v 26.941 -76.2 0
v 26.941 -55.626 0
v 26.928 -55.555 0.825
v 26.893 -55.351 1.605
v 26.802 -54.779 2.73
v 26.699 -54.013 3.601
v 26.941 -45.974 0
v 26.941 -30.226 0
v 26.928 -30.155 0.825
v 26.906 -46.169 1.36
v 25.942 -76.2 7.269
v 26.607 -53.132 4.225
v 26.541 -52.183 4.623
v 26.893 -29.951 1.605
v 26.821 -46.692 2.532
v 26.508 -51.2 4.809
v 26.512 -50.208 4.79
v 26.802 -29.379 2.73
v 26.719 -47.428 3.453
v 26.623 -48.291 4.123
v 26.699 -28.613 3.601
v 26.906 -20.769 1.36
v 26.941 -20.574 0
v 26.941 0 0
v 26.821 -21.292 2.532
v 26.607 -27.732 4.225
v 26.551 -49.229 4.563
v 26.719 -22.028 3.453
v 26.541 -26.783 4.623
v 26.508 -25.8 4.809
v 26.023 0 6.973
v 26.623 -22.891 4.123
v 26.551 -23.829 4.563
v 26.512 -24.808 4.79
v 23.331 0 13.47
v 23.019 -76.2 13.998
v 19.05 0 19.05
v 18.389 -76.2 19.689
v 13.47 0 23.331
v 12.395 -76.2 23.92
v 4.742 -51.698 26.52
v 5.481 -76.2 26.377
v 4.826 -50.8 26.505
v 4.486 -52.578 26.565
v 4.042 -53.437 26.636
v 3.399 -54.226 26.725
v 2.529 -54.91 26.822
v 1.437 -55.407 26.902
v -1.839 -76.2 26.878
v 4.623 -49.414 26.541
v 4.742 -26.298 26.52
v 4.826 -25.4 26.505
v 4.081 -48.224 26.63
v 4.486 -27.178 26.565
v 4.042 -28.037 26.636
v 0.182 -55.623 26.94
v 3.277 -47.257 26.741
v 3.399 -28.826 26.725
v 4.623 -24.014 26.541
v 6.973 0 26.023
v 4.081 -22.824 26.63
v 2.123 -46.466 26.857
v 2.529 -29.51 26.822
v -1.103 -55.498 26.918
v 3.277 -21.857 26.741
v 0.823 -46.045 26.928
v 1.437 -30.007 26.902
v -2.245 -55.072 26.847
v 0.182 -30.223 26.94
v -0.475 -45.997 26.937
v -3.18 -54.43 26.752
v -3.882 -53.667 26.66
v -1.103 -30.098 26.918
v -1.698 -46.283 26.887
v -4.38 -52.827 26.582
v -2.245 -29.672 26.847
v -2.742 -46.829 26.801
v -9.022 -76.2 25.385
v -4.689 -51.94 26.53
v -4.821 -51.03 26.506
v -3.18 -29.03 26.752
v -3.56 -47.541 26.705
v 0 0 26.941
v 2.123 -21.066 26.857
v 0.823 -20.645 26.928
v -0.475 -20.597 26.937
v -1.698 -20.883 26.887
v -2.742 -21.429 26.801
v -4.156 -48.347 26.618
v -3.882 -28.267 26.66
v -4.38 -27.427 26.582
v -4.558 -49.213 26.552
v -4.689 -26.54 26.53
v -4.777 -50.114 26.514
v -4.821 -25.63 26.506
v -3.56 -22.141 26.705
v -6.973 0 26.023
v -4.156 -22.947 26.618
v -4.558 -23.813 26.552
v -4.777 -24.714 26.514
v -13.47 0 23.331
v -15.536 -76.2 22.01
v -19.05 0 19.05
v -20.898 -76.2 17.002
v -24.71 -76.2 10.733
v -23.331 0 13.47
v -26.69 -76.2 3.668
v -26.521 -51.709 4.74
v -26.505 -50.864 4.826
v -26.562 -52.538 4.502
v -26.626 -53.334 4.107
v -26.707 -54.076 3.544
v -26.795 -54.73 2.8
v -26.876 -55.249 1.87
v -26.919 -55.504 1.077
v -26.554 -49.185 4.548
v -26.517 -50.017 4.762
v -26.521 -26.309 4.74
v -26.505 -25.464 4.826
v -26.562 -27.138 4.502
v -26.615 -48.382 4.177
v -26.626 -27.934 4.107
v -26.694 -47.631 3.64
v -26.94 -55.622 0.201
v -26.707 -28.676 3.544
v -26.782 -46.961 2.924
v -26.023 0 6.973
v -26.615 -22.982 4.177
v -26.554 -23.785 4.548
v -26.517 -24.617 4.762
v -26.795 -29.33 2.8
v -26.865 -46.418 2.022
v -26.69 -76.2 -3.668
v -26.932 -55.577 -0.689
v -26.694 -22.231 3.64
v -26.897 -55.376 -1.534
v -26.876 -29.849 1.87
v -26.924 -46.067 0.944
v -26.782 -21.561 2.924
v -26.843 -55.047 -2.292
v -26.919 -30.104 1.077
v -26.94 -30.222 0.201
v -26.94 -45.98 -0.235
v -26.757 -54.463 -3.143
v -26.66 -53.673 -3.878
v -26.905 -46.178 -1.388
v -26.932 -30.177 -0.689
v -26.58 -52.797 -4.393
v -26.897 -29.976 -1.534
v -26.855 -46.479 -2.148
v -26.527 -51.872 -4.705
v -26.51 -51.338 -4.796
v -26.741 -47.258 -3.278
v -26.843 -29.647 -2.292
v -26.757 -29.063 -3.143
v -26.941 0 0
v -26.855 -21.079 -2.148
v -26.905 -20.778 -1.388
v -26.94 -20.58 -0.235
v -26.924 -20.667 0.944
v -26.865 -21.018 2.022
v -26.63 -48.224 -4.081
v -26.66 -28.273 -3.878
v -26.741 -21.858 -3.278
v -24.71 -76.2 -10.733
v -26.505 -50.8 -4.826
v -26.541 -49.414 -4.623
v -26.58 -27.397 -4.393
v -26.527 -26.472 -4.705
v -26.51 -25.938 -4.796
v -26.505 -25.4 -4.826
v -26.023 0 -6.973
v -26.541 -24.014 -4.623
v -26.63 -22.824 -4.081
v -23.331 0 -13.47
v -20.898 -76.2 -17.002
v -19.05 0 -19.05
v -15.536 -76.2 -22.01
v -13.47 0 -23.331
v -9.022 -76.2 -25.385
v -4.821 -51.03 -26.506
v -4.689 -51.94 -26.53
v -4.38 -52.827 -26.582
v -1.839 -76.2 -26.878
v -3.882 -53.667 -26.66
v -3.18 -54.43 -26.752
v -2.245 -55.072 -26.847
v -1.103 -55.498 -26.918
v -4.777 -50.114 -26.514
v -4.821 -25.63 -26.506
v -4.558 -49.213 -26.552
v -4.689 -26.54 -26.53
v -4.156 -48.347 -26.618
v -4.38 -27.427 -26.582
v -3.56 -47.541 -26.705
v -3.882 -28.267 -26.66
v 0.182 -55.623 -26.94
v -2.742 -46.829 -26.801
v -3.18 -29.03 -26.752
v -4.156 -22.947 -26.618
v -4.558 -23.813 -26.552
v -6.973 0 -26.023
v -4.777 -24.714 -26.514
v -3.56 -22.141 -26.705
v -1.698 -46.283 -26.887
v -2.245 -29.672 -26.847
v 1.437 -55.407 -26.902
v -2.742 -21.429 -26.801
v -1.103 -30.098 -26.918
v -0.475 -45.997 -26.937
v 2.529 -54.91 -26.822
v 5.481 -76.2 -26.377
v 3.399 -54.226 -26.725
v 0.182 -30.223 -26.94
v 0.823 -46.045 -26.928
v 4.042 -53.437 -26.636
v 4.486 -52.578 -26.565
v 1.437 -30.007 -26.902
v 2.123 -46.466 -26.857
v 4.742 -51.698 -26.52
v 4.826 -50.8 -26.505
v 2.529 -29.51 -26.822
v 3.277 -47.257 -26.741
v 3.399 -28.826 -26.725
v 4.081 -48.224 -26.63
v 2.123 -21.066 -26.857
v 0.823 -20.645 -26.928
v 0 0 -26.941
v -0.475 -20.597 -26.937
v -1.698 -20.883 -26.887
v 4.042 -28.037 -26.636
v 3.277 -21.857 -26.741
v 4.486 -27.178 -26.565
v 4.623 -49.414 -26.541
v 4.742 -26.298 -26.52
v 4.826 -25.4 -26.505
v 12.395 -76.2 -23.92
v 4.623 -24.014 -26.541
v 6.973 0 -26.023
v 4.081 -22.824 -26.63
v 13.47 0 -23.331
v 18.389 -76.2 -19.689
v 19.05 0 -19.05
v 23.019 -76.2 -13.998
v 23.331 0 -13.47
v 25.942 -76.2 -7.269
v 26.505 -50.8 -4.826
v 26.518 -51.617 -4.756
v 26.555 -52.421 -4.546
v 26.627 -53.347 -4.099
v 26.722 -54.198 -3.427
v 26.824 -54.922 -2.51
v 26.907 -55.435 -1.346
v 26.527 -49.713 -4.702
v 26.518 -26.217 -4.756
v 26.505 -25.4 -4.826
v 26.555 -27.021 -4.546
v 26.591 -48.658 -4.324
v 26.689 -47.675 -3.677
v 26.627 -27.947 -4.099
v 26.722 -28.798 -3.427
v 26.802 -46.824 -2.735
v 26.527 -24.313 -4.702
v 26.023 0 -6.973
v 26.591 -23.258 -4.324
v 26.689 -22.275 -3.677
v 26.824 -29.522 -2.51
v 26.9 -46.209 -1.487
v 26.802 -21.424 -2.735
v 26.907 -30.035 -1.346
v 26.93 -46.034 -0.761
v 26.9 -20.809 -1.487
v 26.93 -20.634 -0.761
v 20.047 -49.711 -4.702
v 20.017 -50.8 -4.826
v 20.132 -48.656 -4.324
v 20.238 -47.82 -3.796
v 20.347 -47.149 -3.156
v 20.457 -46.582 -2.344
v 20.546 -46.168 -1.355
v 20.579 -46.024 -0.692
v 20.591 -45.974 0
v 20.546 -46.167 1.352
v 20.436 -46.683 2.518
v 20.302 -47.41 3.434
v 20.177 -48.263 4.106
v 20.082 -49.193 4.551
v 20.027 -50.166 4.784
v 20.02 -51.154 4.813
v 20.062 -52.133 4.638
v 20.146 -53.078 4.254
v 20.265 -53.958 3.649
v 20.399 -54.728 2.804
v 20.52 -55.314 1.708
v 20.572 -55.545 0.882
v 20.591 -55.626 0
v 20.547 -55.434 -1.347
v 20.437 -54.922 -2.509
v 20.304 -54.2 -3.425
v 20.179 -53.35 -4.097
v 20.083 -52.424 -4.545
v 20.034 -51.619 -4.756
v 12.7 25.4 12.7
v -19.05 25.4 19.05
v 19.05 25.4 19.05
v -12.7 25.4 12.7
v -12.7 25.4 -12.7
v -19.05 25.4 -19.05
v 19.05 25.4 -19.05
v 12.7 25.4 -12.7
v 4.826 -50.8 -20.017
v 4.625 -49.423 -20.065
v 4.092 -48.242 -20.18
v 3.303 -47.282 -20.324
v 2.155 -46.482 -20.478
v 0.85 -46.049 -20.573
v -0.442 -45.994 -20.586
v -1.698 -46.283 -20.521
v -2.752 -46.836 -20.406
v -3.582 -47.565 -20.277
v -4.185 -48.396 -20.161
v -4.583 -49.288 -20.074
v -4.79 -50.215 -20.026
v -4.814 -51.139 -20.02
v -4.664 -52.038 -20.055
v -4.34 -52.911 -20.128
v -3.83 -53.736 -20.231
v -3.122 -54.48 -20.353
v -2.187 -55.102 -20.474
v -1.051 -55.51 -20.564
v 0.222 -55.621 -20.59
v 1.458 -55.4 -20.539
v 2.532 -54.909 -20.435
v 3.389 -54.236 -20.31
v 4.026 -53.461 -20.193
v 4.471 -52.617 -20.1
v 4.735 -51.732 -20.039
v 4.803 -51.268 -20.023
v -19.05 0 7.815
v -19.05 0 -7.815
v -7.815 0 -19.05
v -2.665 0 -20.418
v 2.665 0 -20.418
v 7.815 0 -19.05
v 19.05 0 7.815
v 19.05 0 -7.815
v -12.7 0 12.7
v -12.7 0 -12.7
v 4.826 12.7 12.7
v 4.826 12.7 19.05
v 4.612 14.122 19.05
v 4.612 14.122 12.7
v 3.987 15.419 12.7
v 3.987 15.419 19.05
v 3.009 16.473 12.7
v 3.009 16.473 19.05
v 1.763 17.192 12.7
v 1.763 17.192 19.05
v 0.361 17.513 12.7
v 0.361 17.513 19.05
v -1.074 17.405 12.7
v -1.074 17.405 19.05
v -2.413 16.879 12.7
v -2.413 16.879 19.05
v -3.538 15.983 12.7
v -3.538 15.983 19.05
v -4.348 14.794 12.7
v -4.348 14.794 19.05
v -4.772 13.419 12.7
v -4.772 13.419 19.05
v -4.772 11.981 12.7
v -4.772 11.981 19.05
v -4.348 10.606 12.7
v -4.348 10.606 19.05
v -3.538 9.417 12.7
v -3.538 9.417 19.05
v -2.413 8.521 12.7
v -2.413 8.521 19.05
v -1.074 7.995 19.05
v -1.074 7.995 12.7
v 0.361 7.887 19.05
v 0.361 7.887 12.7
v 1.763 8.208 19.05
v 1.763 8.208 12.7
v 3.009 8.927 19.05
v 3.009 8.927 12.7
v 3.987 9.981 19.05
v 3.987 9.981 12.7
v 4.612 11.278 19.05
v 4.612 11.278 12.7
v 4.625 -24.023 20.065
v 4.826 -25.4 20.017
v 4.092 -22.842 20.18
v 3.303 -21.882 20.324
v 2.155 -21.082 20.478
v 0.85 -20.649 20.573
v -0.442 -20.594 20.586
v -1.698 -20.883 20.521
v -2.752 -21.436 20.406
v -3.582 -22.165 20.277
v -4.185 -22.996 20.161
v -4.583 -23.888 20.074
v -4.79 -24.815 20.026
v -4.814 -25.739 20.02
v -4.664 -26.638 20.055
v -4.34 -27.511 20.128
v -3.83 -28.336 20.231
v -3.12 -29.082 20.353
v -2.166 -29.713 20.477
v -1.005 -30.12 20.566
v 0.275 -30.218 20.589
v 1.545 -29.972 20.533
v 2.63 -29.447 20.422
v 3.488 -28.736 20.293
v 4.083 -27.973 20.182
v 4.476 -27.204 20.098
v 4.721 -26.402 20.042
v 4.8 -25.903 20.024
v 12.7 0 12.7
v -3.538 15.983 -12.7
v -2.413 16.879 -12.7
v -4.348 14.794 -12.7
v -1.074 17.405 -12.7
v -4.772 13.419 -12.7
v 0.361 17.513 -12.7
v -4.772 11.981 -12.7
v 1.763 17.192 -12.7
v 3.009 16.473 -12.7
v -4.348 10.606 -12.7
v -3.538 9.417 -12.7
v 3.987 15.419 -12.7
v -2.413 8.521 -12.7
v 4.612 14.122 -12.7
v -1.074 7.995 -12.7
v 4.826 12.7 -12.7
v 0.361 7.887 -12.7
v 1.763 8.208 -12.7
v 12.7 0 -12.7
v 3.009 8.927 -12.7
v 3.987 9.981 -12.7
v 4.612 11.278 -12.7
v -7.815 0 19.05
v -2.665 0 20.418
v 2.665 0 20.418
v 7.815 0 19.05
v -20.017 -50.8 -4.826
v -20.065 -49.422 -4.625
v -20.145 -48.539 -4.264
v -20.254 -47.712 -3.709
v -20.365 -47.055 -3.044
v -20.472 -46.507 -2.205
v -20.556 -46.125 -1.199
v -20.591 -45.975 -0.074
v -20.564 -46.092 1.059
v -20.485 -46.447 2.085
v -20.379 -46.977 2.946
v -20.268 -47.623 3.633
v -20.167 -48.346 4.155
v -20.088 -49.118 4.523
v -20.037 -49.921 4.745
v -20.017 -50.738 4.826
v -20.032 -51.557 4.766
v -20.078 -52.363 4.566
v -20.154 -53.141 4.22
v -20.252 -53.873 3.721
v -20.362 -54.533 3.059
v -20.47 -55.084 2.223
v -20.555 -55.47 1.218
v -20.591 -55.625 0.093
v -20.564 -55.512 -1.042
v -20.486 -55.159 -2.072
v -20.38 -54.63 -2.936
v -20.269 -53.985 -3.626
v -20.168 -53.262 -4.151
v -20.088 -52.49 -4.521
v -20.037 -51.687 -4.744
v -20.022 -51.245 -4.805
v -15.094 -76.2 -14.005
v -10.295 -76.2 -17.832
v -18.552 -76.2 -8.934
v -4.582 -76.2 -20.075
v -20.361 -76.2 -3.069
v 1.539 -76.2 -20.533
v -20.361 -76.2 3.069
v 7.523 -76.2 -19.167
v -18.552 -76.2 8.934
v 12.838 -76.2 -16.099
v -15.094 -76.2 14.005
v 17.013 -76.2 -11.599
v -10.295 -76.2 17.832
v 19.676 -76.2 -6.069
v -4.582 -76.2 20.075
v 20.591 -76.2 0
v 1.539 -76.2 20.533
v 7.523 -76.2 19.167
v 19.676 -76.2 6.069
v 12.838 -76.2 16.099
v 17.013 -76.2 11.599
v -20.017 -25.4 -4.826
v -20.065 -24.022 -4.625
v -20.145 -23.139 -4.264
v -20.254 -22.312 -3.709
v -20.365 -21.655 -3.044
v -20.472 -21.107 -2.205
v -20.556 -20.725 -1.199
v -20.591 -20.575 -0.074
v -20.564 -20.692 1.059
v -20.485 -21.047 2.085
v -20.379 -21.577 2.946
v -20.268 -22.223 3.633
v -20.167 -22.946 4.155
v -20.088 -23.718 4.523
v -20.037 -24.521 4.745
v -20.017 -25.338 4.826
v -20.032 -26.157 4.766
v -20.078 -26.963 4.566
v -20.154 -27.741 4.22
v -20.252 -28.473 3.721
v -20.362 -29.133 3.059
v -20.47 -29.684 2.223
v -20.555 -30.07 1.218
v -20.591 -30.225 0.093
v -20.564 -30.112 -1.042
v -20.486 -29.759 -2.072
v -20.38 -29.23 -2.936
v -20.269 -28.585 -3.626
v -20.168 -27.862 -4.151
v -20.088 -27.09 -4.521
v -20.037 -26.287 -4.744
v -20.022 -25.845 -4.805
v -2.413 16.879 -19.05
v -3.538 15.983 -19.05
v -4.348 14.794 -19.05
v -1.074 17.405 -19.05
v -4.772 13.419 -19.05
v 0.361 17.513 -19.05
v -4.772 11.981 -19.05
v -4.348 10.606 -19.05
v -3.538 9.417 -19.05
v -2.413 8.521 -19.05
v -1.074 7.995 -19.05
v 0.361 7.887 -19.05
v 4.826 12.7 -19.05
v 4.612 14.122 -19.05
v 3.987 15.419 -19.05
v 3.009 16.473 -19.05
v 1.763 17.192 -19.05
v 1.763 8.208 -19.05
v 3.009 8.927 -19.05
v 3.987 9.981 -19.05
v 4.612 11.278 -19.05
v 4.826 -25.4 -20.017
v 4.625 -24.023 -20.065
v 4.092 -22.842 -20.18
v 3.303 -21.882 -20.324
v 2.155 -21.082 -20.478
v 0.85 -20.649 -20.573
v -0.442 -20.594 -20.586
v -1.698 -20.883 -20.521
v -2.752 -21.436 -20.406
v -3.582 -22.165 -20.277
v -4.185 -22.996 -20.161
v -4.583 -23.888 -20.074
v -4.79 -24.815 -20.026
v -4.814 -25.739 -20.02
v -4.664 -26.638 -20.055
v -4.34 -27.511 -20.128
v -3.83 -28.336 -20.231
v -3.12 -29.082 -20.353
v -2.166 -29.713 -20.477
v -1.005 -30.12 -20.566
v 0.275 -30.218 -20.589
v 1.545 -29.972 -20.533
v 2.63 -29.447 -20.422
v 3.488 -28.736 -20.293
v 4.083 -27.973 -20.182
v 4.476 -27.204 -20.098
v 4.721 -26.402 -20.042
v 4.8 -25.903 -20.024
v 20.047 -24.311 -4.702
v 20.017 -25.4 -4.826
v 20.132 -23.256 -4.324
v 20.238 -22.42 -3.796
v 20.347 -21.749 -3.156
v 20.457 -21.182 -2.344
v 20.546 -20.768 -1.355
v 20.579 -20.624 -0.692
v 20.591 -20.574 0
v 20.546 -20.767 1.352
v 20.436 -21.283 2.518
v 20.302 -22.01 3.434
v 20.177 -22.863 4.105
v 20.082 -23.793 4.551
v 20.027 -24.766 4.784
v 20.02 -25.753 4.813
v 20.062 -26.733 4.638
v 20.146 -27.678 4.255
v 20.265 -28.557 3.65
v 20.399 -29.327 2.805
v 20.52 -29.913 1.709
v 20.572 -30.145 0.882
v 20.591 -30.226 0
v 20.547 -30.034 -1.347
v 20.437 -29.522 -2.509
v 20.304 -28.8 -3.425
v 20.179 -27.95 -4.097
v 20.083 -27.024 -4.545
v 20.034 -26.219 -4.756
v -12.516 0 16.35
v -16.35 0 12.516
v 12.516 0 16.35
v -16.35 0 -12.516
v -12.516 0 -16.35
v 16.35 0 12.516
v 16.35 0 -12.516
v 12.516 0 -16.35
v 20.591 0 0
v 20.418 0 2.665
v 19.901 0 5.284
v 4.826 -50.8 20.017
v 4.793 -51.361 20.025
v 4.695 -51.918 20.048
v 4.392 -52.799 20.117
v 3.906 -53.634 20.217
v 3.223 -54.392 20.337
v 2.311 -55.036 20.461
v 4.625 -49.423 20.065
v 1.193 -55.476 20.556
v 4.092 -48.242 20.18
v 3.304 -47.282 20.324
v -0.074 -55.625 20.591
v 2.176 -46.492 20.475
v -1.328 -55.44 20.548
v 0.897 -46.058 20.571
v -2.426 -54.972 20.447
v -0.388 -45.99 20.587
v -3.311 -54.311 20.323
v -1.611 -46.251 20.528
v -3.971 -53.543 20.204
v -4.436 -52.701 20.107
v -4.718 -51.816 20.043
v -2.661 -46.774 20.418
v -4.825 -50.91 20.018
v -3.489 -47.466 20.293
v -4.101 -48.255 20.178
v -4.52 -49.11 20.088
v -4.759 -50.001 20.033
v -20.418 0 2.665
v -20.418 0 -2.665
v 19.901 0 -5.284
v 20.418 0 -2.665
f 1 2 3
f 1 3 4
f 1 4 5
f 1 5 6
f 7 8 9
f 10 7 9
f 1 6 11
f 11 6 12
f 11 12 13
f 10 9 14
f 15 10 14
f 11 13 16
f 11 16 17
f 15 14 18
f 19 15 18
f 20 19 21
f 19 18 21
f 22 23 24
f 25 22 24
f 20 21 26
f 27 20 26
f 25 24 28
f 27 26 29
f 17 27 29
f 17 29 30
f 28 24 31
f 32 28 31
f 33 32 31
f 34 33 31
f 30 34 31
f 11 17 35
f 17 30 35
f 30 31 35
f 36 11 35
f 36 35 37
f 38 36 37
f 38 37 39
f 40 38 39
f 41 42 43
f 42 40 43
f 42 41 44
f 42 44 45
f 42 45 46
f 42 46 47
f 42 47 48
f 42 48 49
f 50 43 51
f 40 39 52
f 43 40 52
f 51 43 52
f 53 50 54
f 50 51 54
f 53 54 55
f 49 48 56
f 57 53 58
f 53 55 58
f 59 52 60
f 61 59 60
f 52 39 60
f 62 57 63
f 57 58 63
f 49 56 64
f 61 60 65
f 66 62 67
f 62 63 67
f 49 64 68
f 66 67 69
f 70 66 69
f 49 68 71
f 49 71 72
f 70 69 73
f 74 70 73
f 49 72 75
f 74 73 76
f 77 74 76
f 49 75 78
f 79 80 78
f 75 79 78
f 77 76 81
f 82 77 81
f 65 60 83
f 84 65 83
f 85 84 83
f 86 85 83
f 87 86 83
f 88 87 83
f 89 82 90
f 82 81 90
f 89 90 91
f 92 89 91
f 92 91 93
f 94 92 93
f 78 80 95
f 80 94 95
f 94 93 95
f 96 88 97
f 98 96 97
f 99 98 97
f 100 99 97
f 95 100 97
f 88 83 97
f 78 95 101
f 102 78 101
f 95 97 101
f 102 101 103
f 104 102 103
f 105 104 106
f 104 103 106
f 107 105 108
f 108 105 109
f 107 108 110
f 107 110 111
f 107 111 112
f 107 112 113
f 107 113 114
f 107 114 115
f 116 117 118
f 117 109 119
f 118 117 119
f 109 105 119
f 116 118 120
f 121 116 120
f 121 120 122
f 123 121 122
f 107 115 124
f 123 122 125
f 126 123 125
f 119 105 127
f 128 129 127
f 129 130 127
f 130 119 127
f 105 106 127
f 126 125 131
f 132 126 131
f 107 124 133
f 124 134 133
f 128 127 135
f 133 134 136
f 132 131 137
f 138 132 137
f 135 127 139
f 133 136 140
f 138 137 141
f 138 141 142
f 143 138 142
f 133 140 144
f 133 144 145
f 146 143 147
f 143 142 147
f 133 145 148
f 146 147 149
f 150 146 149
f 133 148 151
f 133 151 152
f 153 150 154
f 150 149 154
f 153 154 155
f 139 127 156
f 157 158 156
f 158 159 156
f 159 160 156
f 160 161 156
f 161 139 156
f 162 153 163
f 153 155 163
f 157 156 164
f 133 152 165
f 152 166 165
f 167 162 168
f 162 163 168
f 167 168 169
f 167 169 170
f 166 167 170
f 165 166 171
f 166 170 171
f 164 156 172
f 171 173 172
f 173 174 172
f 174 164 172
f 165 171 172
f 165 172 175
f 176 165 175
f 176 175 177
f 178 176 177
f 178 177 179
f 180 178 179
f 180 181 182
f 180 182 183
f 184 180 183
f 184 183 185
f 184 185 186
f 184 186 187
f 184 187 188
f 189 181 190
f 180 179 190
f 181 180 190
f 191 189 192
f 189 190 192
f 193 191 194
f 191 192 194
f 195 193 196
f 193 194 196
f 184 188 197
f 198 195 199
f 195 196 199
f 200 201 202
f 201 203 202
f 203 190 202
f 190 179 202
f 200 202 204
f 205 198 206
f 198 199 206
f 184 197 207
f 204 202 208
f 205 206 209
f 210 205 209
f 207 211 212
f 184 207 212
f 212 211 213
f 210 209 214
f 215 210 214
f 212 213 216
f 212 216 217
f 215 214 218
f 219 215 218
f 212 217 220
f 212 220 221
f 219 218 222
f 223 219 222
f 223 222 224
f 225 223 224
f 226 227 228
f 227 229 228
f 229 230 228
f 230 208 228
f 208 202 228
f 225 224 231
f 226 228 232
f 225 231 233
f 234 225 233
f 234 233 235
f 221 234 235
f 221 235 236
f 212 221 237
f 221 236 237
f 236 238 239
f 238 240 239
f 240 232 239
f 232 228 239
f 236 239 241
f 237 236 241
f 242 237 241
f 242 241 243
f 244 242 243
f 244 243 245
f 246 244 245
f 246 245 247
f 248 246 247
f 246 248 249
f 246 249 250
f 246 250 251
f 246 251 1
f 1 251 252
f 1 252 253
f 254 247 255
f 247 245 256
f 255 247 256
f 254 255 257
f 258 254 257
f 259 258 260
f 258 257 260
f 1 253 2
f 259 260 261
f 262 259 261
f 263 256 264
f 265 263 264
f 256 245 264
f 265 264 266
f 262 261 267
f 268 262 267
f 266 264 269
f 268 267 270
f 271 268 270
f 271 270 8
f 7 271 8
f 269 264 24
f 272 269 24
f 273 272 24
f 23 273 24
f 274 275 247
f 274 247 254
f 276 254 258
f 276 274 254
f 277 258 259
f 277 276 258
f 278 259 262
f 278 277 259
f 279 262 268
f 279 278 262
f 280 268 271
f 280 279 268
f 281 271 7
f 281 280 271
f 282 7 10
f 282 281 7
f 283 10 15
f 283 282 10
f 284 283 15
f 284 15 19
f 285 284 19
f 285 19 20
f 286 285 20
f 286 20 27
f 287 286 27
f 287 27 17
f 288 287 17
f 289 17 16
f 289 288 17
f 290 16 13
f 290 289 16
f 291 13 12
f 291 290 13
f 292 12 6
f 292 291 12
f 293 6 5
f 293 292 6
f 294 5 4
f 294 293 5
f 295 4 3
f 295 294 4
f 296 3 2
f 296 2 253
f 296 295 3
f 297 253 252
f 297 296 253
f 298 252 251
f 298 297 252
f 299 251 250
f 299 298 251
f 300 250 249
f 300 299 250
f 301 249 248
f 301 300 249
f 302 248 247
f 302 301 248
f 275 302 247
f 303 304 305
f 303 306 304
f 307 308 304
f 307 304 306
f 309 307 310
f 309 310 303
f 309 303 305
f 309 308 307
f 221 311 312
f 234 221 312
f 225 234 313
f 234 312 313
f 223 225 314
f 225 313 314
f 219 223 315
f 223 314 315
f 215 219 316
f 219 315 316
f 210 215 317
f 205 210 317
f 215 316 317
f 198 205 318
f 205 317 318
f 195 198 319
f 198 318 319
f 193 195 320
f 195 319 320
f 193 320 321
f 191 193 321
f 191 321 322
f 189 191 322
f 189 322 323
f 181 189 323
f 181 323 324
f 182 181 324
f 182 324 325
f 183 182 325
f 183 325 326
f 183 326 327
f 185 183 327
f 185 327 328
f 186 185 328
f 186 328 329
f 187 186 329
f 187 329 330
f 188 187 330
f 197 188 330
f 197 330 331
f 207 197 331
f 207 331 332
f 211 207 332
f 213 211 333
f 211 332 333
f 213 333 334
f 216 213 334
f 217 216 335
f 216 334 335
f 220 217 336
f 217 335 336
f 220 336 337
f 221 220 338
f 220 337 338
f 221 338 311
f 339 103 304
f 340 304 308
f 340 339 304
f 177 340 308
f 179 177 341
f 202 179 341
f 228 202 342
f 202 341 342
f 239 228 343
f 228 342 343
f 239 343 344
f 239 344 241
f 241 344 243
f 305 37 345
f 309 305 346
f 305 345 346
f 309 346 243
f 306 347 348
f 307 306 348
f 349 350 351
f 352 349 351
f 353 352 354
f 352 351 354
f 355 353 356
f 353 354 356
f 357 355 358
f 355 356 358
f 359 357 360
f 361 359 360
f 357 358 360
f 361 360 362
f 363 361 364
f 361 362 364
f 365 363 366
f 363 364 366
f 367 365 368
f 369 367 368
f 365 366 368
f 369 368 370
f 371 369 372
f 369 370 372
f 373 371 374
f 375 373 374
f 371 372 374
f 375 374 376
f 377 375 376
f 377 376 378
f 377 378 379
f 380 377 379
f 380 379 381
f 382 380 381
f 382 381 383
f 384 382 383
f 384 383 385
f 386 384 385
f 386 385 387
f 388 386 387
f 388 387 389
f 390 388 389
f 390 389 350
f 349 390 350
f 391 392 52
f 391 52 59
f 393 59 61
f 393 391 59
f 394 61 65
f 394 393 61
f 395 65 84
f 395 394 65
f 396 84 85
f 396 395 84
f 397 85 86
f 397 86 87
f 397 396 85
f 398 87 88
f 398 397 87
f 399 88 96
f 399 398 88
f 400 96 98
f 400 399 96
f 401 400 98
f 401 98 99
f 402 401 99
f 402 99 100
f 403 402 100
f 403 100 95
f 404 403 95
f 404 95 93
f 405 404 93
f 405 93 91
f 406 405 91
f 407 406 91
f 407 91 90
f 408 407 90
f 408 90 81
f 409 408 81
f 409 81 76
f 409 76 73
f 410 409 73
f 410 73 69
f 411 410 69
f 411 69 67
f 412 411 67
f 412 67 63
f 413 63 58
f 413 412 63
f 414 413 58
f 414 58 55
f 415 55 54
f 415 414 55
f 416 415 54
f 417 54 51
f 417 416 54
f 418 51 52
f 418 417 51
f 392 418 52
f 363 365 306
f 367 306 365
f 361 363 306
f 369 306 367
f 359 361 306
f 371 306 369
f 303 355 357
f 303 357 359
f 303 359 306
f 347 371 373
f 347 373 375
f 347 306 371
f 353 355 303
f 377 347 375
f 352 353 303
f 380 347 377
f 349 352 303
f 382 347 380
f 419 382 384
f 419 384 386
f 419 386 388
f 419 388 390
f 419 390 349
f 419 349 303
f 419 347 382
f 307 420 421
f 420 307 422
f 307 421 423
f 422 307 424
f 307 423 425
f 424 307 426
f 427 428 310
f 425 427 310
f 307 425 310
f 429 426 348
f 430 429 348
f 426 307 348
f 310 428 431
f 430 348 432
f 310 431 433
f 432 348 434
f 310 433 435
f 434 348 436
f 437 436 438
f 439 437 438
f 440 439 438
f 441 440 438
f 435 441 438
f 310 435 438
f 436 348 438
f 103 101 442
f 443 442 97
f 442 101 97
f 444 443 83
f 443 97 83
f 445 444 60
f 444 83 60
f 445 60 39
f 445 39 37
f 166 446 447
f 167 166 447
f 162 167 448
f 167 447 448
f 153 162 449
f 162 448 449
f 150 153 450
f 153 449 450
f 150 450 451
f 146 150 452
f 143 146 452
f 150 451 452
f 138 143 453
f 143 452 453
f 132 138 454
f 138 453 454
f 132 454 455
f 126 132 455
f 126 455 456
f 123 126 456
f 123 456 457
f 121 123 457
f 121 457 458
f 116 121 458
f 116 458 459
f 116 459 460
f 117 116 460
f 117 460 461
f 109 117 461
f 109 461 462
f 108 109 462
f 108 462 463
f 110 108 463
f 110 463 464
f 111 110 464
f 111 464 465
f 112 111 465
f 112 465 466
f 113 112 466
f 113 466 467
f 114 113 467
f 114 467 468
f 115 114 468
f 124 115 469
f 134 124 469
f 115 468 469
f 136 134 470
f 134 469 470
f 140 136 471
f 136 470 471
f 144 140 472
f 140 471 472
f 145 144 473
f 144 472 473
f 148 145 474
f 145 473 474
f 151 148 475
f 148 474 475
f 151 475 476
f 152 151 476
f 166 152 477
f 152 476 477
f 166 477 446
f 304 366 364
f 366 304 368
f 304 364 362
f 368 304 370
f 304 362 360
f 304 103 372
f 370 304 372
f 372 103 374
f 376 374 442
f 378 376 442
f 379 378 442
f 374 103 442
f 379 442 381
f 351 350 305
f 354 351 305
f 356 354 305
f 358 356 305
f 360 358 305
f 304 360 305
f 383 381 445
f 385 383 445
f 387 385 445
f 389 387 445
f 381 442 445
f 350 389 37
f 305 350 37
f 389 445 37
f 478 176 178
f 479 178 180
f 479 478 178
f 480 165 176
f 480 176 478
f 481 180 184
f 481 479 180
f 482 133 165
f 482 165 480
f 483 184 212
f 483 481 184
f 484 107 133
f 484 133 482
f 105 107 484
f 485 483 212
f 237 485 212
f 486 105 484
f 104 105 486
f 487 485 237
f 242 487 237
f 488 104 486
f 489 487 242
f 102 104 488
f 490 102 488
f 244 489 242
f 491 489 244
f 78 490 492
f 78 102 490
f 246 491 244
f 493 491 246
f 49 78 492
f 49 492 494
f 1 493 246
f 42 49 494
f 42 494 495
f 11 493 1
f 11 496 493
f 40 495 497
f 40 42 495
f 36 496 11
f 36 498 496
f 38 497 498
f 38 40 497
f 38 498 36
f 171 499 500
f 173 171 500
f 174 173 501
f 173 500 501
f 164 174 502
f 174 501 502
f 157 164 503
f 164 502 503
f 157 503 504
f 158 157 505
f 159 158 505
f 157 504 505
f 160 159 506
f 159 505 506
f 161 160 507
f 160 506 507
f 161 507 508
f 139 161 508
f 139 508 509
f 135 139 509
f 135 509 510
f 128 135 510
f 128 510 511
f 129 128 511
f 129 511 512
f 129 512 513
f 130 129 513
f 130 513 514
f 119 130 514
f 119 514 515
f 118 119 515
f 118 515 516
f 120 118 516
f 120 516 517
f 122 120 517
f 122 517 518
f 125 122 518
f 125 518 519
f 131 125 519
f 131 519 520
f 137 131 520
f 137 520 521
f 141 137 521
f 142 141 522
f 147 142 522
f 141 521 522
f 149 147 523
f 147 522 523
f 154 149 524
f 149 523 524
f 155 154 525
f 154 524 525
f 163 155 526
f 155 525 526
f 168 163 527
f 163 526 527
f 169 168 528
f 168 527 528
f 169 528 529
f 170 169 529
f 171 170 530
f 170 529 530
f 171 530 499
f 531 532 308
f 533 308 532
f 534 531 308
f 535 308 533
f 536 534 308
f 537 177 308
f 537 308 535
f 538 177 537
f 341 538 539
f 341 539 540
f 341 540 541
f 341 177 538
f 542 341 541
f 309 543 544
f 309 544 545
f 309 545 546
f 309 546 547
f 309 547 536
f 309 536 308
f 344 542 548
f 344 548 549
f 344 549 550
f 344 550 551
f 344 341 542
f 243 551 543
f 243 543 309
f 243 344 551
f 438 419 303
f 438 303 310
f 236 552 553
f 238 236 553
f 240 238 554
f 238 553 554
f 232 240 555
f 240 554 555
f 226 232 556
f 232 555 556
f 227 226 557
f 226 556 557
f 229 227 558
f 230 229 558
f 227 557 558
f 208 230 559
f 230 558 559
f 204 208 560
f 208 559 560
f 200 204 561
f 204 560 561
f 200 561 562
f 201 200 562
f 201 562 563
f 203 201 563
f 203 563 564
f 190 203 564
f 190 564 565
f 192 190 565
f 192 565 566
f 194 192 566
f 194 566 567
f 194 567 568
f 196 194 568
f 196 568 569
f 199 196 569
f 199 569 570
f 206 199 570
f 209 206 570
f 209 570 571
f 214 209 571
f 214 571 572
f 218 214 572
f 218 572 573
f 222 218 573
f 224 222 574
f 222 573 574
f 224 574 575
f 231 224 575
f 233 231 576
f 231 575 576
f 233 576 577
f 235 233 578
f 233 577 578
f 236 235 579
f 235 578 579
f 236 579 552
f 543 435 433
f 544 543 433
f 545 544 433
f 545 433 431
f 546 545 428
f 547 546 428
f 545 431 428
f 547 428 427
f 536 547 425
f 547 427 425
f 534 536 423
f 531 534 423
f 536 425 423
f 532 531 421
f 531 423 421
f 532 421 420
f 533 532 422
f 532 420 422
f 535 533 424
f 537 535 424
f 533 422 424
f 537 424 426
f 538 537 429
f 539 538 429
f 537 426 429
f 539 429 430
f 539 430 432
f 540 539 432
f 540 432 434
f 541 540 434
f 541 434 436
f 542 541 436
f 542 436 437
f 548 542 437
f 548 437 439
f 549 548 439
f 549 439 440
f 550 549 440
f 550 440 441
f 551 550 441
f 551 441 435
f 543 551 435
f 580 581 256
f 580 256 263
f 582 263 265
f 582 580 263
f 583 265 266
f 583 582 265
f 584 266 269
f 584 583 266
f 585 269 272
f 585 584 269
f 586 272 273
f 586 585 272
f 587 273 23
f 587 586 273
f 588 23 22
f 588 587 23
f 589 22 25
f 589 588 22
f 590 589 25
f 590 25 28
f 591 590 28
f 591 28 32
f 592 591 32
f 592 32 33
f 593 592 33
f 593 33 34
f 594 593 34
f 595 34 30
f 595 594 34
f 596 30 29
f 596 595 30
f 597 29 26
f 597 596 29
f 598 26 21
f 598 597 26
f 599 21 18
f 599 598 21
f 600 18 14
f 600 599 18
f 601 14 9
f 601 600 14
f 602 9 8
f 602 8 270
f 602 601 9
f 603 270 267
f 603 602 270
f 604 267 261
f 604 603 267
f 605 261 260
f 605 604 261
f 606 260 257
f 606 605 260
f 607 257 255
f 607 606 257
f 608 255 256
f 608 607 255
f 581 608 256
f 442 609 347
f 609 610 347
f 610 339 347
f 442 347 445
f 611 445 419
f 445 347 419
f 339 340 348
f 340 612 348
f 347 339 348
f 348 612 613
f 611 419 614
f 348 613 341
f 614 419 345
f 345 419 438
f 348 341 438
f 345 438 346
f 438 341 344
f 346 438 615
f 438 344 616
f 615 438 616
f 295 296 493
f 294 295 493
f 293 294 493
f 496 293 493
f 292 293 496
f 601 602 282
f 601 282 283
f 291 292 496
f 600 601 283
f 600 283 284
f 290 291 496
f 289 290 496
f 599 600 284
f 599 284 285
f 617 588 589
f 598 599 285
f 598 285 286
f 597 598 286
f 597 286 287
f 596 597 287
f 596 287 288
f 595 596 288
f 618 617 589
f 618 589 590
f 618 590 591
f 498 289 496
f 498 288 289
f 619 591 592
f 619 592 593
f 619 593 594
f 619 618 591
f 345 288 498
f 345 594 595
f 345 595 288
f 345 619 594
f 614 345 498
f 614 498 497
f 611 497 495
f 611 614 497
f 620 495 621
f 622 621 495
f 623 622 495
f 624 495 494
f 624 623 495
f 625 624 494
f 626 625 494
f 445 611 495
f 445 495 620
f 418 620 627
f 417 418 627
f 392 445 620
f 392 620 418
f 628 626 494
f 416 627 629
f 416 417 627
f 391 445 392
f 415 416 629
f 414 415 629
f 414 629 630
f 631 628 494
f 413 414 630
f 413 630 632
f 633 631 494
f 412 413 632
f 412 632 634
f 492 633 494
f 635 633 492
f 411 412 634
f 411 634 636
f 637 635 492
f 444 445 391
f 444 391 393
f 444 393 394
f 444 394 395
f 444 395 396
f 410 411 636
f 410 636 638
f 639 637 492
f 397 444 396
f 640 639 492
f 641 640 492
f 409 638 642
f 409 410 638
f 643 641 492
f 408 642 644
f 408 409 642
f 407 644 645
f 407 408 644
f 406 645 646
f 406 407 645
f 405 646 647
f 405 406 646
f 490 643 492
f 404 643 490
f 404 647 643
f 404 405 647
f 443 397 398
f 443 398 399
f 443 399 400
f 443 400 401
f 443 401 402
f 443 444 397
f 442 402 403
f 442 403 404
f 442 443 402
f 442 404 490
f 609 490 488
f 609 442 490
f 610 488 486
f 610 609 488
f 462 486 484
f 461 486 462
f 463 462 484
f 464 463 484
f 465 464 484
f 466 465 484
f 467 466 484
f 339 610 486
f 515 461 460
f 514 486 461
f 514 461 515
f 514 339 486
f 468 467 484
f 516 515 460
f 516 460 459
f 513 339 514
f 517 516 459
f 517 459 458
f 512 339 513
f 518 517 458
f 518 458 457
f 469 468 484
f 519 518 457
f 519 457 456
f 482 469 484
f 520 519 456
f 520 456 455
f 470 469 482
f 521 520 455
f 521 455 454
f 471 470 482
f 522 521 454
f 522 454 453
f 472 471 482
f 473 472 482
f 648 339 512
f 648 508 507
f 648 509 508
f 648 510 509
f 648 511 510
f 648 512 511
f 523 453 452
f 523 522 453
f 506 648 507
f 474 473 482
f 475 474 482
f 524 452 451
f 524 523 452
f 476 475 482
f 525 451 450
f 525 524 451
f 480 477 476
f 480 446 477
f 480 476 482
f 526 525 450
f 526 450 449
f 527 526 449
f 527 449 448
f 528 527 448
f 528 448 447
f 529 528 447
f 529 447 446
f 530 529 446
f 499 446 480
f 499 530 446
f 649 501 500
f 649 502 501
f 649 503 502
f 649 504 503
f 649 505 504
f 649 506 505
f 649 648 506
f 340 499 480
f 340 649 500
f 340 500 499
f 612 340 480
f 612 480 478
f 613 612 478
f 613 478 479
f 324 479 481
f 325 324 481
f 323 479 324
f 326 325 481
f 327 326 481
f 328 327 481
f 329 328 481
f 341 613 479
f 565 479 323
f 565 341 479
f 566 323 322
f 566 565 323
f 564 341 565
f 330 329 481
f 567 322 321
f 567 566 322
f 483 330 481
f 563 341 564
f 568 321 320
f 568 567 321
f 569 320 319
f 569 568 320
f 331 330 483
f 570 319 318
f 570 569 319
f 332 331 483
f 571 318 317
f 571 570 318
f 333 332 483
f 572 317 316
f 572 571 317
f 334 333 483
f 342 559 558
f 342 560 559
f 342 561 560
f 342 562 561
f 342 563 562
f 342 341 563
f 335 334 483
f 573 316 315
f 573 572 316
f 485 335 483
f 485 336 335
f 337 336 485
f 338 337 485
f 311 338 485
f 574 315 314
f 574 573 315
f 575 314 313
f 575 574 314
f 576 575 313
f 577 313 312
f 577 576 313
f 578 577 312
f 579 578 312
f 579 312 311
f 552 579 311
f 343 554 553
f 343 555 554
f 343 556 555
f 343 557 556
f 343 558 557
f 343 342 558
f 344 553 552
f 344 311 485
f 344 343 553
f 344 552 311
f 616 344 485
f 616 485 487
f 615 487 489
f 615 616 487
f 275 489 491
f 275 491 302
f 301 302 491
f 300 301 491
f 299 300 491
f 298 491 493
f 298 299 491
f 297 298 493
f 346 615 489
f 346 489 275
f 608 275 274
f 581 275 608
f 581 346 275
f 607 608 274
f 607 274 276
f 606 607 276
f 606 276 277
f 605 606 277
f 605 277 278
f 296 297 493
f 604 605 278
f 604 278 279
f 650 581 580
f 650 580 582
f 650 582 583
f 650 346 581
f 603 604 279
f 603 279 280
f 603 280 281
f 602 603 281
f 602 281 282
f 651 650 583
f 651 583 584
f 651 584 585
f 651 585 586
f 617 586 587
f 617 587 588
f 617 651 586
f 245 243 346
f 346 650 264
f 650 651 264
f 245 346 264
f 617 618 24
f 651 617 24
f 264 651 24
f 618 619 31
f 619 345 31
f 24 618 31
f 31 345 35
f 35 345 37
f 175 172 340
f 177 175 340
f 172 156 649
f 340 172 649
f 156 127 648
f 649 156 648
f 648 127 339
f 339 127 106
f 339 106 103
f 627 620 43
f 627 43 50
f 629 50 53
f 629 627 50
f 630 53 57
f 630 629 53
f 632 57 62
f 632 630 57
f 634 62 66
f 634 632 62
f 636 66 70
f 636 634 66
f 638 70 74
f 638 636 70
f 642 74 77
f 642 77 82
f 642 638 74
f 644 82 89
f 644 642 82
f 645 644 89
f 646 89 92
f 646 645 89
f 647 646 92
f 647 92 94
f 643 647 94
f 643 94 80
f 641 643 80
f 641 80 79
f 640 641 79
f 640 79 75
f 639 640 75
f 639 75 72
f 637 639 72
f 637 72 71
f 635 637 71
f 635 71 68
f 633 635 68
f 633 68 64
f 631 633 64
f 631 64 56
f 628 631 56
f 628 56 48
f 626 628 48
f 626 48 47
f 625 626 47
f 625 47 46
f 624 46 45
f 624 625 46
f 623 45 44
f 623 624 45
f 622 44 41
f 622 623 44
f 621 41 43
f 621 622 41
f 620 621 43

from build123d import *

# Parameters (mm, degrees)
SKETCH2_W               = 38.1
SKETCH2_H               = 38.1
SKETCH2_W_2             = 25.4
SKETCH2_H_2             = 25.4
BOSS_EXTRUDE1_DEPTH     = 25.4
SKETCH3_R               = 26.940768363
SKETCH3_R_2             = 20.590768363
BOSS_EXTRUDE2_DEPTH     = 76.2
SKETCH4_R               = 4.826
CUT_EXTRUDE1_DEPTH      = 50.8
SKETCH5_R               = 4.826
CUT_EXTRUDE2_DEPTH      = 27.940768363
CUT_EXTRUDE2_DEPTH_BACK = 27.940768363
SKETCH6_R               = 4.826
CUT_EXTRUDE3_DEPTH      = 27.940768463
CUT_EXTRUDE3_DEPTH_BACK = 27.940768463


with BuildPart() as part:
    # Sketch2 → Boss-Extrude1 (new body)
    with BuildSketch(Plane(origin=(0, 0, 0), x_dir=(1, 0, 0), z_dir=(0, 1, 0))):
        Rectangle(SKETCH2_W, SKETCH2_H)
        Rectangle(SKETCH2_W_2, SKETCH2_H_2, mode=Mode.SUBTRACT)
    extrude(amount=BOSS_EXTRUDE1_DEPTH)

    # Sketch3 → Boss-Extrude2 (add)
    with BuildSketch(Plane.XZ):
        Circle(SKETCH3_R)
        Circle(SKETCH3_R_2, mode=Mode.SUBTRACT)
    extrude(amount=BOSS_EXTRUDE2_DEPTH)

    # Sketch4 → Cut-Extrude1 (cut)
    with BuildSketch(Plane.XY.offset(19.05)):
        with Locations((0, 12.7)):
            Circle(SKETCH4_R)
    extrude(amount=-CUT_EXTRUDE1_DEPTH, mode=Mode.SUBTRACT)

    # Sketch5 → Cut-Extrude2 (cut, two sides)
    with BuildSketch(Plane.XY) as cut_extrude2_sk:
        with Locations((0, -25.4)):
            Circle(SKETCH5_R)
        with Locations((0, -50.8)):
            Circle(SKETCH5_R)
    extrude(amount=CUT_EXTRUDE2_DEPTH, mode=Mode.SUBTRACT)
    extrude(cut_extrude2_sk.sketch, amount=-CUT_EXTRUDE2_DEPTH_BACK, mode=Mode.SUBTRACT)

    # Sketch6 → Cut-Extrude3 (cut, two sides)
    with BuildSketch(Plane(origin=(0, 0, 0), x_dir=(0, 0, -1), z_dir=(1, 0, 0))) as cut_extrude3_sk:
        with Locations((0, -50.8)):
            Circle(SKETCH6_R)
        with Locations((0, -25.4)):
            Circle(SKETCH6_R)
    extrude(amount=CUT_EXTRUDE3_DEPTH, mode=Mode.SUBTRACT)
    extrude(cut_extrude3_sk.sketch, amount=-CUT_EXTRUDE3_DEPTH_BACK, mode=Mode.SUBTRACT)


solid = part.part
